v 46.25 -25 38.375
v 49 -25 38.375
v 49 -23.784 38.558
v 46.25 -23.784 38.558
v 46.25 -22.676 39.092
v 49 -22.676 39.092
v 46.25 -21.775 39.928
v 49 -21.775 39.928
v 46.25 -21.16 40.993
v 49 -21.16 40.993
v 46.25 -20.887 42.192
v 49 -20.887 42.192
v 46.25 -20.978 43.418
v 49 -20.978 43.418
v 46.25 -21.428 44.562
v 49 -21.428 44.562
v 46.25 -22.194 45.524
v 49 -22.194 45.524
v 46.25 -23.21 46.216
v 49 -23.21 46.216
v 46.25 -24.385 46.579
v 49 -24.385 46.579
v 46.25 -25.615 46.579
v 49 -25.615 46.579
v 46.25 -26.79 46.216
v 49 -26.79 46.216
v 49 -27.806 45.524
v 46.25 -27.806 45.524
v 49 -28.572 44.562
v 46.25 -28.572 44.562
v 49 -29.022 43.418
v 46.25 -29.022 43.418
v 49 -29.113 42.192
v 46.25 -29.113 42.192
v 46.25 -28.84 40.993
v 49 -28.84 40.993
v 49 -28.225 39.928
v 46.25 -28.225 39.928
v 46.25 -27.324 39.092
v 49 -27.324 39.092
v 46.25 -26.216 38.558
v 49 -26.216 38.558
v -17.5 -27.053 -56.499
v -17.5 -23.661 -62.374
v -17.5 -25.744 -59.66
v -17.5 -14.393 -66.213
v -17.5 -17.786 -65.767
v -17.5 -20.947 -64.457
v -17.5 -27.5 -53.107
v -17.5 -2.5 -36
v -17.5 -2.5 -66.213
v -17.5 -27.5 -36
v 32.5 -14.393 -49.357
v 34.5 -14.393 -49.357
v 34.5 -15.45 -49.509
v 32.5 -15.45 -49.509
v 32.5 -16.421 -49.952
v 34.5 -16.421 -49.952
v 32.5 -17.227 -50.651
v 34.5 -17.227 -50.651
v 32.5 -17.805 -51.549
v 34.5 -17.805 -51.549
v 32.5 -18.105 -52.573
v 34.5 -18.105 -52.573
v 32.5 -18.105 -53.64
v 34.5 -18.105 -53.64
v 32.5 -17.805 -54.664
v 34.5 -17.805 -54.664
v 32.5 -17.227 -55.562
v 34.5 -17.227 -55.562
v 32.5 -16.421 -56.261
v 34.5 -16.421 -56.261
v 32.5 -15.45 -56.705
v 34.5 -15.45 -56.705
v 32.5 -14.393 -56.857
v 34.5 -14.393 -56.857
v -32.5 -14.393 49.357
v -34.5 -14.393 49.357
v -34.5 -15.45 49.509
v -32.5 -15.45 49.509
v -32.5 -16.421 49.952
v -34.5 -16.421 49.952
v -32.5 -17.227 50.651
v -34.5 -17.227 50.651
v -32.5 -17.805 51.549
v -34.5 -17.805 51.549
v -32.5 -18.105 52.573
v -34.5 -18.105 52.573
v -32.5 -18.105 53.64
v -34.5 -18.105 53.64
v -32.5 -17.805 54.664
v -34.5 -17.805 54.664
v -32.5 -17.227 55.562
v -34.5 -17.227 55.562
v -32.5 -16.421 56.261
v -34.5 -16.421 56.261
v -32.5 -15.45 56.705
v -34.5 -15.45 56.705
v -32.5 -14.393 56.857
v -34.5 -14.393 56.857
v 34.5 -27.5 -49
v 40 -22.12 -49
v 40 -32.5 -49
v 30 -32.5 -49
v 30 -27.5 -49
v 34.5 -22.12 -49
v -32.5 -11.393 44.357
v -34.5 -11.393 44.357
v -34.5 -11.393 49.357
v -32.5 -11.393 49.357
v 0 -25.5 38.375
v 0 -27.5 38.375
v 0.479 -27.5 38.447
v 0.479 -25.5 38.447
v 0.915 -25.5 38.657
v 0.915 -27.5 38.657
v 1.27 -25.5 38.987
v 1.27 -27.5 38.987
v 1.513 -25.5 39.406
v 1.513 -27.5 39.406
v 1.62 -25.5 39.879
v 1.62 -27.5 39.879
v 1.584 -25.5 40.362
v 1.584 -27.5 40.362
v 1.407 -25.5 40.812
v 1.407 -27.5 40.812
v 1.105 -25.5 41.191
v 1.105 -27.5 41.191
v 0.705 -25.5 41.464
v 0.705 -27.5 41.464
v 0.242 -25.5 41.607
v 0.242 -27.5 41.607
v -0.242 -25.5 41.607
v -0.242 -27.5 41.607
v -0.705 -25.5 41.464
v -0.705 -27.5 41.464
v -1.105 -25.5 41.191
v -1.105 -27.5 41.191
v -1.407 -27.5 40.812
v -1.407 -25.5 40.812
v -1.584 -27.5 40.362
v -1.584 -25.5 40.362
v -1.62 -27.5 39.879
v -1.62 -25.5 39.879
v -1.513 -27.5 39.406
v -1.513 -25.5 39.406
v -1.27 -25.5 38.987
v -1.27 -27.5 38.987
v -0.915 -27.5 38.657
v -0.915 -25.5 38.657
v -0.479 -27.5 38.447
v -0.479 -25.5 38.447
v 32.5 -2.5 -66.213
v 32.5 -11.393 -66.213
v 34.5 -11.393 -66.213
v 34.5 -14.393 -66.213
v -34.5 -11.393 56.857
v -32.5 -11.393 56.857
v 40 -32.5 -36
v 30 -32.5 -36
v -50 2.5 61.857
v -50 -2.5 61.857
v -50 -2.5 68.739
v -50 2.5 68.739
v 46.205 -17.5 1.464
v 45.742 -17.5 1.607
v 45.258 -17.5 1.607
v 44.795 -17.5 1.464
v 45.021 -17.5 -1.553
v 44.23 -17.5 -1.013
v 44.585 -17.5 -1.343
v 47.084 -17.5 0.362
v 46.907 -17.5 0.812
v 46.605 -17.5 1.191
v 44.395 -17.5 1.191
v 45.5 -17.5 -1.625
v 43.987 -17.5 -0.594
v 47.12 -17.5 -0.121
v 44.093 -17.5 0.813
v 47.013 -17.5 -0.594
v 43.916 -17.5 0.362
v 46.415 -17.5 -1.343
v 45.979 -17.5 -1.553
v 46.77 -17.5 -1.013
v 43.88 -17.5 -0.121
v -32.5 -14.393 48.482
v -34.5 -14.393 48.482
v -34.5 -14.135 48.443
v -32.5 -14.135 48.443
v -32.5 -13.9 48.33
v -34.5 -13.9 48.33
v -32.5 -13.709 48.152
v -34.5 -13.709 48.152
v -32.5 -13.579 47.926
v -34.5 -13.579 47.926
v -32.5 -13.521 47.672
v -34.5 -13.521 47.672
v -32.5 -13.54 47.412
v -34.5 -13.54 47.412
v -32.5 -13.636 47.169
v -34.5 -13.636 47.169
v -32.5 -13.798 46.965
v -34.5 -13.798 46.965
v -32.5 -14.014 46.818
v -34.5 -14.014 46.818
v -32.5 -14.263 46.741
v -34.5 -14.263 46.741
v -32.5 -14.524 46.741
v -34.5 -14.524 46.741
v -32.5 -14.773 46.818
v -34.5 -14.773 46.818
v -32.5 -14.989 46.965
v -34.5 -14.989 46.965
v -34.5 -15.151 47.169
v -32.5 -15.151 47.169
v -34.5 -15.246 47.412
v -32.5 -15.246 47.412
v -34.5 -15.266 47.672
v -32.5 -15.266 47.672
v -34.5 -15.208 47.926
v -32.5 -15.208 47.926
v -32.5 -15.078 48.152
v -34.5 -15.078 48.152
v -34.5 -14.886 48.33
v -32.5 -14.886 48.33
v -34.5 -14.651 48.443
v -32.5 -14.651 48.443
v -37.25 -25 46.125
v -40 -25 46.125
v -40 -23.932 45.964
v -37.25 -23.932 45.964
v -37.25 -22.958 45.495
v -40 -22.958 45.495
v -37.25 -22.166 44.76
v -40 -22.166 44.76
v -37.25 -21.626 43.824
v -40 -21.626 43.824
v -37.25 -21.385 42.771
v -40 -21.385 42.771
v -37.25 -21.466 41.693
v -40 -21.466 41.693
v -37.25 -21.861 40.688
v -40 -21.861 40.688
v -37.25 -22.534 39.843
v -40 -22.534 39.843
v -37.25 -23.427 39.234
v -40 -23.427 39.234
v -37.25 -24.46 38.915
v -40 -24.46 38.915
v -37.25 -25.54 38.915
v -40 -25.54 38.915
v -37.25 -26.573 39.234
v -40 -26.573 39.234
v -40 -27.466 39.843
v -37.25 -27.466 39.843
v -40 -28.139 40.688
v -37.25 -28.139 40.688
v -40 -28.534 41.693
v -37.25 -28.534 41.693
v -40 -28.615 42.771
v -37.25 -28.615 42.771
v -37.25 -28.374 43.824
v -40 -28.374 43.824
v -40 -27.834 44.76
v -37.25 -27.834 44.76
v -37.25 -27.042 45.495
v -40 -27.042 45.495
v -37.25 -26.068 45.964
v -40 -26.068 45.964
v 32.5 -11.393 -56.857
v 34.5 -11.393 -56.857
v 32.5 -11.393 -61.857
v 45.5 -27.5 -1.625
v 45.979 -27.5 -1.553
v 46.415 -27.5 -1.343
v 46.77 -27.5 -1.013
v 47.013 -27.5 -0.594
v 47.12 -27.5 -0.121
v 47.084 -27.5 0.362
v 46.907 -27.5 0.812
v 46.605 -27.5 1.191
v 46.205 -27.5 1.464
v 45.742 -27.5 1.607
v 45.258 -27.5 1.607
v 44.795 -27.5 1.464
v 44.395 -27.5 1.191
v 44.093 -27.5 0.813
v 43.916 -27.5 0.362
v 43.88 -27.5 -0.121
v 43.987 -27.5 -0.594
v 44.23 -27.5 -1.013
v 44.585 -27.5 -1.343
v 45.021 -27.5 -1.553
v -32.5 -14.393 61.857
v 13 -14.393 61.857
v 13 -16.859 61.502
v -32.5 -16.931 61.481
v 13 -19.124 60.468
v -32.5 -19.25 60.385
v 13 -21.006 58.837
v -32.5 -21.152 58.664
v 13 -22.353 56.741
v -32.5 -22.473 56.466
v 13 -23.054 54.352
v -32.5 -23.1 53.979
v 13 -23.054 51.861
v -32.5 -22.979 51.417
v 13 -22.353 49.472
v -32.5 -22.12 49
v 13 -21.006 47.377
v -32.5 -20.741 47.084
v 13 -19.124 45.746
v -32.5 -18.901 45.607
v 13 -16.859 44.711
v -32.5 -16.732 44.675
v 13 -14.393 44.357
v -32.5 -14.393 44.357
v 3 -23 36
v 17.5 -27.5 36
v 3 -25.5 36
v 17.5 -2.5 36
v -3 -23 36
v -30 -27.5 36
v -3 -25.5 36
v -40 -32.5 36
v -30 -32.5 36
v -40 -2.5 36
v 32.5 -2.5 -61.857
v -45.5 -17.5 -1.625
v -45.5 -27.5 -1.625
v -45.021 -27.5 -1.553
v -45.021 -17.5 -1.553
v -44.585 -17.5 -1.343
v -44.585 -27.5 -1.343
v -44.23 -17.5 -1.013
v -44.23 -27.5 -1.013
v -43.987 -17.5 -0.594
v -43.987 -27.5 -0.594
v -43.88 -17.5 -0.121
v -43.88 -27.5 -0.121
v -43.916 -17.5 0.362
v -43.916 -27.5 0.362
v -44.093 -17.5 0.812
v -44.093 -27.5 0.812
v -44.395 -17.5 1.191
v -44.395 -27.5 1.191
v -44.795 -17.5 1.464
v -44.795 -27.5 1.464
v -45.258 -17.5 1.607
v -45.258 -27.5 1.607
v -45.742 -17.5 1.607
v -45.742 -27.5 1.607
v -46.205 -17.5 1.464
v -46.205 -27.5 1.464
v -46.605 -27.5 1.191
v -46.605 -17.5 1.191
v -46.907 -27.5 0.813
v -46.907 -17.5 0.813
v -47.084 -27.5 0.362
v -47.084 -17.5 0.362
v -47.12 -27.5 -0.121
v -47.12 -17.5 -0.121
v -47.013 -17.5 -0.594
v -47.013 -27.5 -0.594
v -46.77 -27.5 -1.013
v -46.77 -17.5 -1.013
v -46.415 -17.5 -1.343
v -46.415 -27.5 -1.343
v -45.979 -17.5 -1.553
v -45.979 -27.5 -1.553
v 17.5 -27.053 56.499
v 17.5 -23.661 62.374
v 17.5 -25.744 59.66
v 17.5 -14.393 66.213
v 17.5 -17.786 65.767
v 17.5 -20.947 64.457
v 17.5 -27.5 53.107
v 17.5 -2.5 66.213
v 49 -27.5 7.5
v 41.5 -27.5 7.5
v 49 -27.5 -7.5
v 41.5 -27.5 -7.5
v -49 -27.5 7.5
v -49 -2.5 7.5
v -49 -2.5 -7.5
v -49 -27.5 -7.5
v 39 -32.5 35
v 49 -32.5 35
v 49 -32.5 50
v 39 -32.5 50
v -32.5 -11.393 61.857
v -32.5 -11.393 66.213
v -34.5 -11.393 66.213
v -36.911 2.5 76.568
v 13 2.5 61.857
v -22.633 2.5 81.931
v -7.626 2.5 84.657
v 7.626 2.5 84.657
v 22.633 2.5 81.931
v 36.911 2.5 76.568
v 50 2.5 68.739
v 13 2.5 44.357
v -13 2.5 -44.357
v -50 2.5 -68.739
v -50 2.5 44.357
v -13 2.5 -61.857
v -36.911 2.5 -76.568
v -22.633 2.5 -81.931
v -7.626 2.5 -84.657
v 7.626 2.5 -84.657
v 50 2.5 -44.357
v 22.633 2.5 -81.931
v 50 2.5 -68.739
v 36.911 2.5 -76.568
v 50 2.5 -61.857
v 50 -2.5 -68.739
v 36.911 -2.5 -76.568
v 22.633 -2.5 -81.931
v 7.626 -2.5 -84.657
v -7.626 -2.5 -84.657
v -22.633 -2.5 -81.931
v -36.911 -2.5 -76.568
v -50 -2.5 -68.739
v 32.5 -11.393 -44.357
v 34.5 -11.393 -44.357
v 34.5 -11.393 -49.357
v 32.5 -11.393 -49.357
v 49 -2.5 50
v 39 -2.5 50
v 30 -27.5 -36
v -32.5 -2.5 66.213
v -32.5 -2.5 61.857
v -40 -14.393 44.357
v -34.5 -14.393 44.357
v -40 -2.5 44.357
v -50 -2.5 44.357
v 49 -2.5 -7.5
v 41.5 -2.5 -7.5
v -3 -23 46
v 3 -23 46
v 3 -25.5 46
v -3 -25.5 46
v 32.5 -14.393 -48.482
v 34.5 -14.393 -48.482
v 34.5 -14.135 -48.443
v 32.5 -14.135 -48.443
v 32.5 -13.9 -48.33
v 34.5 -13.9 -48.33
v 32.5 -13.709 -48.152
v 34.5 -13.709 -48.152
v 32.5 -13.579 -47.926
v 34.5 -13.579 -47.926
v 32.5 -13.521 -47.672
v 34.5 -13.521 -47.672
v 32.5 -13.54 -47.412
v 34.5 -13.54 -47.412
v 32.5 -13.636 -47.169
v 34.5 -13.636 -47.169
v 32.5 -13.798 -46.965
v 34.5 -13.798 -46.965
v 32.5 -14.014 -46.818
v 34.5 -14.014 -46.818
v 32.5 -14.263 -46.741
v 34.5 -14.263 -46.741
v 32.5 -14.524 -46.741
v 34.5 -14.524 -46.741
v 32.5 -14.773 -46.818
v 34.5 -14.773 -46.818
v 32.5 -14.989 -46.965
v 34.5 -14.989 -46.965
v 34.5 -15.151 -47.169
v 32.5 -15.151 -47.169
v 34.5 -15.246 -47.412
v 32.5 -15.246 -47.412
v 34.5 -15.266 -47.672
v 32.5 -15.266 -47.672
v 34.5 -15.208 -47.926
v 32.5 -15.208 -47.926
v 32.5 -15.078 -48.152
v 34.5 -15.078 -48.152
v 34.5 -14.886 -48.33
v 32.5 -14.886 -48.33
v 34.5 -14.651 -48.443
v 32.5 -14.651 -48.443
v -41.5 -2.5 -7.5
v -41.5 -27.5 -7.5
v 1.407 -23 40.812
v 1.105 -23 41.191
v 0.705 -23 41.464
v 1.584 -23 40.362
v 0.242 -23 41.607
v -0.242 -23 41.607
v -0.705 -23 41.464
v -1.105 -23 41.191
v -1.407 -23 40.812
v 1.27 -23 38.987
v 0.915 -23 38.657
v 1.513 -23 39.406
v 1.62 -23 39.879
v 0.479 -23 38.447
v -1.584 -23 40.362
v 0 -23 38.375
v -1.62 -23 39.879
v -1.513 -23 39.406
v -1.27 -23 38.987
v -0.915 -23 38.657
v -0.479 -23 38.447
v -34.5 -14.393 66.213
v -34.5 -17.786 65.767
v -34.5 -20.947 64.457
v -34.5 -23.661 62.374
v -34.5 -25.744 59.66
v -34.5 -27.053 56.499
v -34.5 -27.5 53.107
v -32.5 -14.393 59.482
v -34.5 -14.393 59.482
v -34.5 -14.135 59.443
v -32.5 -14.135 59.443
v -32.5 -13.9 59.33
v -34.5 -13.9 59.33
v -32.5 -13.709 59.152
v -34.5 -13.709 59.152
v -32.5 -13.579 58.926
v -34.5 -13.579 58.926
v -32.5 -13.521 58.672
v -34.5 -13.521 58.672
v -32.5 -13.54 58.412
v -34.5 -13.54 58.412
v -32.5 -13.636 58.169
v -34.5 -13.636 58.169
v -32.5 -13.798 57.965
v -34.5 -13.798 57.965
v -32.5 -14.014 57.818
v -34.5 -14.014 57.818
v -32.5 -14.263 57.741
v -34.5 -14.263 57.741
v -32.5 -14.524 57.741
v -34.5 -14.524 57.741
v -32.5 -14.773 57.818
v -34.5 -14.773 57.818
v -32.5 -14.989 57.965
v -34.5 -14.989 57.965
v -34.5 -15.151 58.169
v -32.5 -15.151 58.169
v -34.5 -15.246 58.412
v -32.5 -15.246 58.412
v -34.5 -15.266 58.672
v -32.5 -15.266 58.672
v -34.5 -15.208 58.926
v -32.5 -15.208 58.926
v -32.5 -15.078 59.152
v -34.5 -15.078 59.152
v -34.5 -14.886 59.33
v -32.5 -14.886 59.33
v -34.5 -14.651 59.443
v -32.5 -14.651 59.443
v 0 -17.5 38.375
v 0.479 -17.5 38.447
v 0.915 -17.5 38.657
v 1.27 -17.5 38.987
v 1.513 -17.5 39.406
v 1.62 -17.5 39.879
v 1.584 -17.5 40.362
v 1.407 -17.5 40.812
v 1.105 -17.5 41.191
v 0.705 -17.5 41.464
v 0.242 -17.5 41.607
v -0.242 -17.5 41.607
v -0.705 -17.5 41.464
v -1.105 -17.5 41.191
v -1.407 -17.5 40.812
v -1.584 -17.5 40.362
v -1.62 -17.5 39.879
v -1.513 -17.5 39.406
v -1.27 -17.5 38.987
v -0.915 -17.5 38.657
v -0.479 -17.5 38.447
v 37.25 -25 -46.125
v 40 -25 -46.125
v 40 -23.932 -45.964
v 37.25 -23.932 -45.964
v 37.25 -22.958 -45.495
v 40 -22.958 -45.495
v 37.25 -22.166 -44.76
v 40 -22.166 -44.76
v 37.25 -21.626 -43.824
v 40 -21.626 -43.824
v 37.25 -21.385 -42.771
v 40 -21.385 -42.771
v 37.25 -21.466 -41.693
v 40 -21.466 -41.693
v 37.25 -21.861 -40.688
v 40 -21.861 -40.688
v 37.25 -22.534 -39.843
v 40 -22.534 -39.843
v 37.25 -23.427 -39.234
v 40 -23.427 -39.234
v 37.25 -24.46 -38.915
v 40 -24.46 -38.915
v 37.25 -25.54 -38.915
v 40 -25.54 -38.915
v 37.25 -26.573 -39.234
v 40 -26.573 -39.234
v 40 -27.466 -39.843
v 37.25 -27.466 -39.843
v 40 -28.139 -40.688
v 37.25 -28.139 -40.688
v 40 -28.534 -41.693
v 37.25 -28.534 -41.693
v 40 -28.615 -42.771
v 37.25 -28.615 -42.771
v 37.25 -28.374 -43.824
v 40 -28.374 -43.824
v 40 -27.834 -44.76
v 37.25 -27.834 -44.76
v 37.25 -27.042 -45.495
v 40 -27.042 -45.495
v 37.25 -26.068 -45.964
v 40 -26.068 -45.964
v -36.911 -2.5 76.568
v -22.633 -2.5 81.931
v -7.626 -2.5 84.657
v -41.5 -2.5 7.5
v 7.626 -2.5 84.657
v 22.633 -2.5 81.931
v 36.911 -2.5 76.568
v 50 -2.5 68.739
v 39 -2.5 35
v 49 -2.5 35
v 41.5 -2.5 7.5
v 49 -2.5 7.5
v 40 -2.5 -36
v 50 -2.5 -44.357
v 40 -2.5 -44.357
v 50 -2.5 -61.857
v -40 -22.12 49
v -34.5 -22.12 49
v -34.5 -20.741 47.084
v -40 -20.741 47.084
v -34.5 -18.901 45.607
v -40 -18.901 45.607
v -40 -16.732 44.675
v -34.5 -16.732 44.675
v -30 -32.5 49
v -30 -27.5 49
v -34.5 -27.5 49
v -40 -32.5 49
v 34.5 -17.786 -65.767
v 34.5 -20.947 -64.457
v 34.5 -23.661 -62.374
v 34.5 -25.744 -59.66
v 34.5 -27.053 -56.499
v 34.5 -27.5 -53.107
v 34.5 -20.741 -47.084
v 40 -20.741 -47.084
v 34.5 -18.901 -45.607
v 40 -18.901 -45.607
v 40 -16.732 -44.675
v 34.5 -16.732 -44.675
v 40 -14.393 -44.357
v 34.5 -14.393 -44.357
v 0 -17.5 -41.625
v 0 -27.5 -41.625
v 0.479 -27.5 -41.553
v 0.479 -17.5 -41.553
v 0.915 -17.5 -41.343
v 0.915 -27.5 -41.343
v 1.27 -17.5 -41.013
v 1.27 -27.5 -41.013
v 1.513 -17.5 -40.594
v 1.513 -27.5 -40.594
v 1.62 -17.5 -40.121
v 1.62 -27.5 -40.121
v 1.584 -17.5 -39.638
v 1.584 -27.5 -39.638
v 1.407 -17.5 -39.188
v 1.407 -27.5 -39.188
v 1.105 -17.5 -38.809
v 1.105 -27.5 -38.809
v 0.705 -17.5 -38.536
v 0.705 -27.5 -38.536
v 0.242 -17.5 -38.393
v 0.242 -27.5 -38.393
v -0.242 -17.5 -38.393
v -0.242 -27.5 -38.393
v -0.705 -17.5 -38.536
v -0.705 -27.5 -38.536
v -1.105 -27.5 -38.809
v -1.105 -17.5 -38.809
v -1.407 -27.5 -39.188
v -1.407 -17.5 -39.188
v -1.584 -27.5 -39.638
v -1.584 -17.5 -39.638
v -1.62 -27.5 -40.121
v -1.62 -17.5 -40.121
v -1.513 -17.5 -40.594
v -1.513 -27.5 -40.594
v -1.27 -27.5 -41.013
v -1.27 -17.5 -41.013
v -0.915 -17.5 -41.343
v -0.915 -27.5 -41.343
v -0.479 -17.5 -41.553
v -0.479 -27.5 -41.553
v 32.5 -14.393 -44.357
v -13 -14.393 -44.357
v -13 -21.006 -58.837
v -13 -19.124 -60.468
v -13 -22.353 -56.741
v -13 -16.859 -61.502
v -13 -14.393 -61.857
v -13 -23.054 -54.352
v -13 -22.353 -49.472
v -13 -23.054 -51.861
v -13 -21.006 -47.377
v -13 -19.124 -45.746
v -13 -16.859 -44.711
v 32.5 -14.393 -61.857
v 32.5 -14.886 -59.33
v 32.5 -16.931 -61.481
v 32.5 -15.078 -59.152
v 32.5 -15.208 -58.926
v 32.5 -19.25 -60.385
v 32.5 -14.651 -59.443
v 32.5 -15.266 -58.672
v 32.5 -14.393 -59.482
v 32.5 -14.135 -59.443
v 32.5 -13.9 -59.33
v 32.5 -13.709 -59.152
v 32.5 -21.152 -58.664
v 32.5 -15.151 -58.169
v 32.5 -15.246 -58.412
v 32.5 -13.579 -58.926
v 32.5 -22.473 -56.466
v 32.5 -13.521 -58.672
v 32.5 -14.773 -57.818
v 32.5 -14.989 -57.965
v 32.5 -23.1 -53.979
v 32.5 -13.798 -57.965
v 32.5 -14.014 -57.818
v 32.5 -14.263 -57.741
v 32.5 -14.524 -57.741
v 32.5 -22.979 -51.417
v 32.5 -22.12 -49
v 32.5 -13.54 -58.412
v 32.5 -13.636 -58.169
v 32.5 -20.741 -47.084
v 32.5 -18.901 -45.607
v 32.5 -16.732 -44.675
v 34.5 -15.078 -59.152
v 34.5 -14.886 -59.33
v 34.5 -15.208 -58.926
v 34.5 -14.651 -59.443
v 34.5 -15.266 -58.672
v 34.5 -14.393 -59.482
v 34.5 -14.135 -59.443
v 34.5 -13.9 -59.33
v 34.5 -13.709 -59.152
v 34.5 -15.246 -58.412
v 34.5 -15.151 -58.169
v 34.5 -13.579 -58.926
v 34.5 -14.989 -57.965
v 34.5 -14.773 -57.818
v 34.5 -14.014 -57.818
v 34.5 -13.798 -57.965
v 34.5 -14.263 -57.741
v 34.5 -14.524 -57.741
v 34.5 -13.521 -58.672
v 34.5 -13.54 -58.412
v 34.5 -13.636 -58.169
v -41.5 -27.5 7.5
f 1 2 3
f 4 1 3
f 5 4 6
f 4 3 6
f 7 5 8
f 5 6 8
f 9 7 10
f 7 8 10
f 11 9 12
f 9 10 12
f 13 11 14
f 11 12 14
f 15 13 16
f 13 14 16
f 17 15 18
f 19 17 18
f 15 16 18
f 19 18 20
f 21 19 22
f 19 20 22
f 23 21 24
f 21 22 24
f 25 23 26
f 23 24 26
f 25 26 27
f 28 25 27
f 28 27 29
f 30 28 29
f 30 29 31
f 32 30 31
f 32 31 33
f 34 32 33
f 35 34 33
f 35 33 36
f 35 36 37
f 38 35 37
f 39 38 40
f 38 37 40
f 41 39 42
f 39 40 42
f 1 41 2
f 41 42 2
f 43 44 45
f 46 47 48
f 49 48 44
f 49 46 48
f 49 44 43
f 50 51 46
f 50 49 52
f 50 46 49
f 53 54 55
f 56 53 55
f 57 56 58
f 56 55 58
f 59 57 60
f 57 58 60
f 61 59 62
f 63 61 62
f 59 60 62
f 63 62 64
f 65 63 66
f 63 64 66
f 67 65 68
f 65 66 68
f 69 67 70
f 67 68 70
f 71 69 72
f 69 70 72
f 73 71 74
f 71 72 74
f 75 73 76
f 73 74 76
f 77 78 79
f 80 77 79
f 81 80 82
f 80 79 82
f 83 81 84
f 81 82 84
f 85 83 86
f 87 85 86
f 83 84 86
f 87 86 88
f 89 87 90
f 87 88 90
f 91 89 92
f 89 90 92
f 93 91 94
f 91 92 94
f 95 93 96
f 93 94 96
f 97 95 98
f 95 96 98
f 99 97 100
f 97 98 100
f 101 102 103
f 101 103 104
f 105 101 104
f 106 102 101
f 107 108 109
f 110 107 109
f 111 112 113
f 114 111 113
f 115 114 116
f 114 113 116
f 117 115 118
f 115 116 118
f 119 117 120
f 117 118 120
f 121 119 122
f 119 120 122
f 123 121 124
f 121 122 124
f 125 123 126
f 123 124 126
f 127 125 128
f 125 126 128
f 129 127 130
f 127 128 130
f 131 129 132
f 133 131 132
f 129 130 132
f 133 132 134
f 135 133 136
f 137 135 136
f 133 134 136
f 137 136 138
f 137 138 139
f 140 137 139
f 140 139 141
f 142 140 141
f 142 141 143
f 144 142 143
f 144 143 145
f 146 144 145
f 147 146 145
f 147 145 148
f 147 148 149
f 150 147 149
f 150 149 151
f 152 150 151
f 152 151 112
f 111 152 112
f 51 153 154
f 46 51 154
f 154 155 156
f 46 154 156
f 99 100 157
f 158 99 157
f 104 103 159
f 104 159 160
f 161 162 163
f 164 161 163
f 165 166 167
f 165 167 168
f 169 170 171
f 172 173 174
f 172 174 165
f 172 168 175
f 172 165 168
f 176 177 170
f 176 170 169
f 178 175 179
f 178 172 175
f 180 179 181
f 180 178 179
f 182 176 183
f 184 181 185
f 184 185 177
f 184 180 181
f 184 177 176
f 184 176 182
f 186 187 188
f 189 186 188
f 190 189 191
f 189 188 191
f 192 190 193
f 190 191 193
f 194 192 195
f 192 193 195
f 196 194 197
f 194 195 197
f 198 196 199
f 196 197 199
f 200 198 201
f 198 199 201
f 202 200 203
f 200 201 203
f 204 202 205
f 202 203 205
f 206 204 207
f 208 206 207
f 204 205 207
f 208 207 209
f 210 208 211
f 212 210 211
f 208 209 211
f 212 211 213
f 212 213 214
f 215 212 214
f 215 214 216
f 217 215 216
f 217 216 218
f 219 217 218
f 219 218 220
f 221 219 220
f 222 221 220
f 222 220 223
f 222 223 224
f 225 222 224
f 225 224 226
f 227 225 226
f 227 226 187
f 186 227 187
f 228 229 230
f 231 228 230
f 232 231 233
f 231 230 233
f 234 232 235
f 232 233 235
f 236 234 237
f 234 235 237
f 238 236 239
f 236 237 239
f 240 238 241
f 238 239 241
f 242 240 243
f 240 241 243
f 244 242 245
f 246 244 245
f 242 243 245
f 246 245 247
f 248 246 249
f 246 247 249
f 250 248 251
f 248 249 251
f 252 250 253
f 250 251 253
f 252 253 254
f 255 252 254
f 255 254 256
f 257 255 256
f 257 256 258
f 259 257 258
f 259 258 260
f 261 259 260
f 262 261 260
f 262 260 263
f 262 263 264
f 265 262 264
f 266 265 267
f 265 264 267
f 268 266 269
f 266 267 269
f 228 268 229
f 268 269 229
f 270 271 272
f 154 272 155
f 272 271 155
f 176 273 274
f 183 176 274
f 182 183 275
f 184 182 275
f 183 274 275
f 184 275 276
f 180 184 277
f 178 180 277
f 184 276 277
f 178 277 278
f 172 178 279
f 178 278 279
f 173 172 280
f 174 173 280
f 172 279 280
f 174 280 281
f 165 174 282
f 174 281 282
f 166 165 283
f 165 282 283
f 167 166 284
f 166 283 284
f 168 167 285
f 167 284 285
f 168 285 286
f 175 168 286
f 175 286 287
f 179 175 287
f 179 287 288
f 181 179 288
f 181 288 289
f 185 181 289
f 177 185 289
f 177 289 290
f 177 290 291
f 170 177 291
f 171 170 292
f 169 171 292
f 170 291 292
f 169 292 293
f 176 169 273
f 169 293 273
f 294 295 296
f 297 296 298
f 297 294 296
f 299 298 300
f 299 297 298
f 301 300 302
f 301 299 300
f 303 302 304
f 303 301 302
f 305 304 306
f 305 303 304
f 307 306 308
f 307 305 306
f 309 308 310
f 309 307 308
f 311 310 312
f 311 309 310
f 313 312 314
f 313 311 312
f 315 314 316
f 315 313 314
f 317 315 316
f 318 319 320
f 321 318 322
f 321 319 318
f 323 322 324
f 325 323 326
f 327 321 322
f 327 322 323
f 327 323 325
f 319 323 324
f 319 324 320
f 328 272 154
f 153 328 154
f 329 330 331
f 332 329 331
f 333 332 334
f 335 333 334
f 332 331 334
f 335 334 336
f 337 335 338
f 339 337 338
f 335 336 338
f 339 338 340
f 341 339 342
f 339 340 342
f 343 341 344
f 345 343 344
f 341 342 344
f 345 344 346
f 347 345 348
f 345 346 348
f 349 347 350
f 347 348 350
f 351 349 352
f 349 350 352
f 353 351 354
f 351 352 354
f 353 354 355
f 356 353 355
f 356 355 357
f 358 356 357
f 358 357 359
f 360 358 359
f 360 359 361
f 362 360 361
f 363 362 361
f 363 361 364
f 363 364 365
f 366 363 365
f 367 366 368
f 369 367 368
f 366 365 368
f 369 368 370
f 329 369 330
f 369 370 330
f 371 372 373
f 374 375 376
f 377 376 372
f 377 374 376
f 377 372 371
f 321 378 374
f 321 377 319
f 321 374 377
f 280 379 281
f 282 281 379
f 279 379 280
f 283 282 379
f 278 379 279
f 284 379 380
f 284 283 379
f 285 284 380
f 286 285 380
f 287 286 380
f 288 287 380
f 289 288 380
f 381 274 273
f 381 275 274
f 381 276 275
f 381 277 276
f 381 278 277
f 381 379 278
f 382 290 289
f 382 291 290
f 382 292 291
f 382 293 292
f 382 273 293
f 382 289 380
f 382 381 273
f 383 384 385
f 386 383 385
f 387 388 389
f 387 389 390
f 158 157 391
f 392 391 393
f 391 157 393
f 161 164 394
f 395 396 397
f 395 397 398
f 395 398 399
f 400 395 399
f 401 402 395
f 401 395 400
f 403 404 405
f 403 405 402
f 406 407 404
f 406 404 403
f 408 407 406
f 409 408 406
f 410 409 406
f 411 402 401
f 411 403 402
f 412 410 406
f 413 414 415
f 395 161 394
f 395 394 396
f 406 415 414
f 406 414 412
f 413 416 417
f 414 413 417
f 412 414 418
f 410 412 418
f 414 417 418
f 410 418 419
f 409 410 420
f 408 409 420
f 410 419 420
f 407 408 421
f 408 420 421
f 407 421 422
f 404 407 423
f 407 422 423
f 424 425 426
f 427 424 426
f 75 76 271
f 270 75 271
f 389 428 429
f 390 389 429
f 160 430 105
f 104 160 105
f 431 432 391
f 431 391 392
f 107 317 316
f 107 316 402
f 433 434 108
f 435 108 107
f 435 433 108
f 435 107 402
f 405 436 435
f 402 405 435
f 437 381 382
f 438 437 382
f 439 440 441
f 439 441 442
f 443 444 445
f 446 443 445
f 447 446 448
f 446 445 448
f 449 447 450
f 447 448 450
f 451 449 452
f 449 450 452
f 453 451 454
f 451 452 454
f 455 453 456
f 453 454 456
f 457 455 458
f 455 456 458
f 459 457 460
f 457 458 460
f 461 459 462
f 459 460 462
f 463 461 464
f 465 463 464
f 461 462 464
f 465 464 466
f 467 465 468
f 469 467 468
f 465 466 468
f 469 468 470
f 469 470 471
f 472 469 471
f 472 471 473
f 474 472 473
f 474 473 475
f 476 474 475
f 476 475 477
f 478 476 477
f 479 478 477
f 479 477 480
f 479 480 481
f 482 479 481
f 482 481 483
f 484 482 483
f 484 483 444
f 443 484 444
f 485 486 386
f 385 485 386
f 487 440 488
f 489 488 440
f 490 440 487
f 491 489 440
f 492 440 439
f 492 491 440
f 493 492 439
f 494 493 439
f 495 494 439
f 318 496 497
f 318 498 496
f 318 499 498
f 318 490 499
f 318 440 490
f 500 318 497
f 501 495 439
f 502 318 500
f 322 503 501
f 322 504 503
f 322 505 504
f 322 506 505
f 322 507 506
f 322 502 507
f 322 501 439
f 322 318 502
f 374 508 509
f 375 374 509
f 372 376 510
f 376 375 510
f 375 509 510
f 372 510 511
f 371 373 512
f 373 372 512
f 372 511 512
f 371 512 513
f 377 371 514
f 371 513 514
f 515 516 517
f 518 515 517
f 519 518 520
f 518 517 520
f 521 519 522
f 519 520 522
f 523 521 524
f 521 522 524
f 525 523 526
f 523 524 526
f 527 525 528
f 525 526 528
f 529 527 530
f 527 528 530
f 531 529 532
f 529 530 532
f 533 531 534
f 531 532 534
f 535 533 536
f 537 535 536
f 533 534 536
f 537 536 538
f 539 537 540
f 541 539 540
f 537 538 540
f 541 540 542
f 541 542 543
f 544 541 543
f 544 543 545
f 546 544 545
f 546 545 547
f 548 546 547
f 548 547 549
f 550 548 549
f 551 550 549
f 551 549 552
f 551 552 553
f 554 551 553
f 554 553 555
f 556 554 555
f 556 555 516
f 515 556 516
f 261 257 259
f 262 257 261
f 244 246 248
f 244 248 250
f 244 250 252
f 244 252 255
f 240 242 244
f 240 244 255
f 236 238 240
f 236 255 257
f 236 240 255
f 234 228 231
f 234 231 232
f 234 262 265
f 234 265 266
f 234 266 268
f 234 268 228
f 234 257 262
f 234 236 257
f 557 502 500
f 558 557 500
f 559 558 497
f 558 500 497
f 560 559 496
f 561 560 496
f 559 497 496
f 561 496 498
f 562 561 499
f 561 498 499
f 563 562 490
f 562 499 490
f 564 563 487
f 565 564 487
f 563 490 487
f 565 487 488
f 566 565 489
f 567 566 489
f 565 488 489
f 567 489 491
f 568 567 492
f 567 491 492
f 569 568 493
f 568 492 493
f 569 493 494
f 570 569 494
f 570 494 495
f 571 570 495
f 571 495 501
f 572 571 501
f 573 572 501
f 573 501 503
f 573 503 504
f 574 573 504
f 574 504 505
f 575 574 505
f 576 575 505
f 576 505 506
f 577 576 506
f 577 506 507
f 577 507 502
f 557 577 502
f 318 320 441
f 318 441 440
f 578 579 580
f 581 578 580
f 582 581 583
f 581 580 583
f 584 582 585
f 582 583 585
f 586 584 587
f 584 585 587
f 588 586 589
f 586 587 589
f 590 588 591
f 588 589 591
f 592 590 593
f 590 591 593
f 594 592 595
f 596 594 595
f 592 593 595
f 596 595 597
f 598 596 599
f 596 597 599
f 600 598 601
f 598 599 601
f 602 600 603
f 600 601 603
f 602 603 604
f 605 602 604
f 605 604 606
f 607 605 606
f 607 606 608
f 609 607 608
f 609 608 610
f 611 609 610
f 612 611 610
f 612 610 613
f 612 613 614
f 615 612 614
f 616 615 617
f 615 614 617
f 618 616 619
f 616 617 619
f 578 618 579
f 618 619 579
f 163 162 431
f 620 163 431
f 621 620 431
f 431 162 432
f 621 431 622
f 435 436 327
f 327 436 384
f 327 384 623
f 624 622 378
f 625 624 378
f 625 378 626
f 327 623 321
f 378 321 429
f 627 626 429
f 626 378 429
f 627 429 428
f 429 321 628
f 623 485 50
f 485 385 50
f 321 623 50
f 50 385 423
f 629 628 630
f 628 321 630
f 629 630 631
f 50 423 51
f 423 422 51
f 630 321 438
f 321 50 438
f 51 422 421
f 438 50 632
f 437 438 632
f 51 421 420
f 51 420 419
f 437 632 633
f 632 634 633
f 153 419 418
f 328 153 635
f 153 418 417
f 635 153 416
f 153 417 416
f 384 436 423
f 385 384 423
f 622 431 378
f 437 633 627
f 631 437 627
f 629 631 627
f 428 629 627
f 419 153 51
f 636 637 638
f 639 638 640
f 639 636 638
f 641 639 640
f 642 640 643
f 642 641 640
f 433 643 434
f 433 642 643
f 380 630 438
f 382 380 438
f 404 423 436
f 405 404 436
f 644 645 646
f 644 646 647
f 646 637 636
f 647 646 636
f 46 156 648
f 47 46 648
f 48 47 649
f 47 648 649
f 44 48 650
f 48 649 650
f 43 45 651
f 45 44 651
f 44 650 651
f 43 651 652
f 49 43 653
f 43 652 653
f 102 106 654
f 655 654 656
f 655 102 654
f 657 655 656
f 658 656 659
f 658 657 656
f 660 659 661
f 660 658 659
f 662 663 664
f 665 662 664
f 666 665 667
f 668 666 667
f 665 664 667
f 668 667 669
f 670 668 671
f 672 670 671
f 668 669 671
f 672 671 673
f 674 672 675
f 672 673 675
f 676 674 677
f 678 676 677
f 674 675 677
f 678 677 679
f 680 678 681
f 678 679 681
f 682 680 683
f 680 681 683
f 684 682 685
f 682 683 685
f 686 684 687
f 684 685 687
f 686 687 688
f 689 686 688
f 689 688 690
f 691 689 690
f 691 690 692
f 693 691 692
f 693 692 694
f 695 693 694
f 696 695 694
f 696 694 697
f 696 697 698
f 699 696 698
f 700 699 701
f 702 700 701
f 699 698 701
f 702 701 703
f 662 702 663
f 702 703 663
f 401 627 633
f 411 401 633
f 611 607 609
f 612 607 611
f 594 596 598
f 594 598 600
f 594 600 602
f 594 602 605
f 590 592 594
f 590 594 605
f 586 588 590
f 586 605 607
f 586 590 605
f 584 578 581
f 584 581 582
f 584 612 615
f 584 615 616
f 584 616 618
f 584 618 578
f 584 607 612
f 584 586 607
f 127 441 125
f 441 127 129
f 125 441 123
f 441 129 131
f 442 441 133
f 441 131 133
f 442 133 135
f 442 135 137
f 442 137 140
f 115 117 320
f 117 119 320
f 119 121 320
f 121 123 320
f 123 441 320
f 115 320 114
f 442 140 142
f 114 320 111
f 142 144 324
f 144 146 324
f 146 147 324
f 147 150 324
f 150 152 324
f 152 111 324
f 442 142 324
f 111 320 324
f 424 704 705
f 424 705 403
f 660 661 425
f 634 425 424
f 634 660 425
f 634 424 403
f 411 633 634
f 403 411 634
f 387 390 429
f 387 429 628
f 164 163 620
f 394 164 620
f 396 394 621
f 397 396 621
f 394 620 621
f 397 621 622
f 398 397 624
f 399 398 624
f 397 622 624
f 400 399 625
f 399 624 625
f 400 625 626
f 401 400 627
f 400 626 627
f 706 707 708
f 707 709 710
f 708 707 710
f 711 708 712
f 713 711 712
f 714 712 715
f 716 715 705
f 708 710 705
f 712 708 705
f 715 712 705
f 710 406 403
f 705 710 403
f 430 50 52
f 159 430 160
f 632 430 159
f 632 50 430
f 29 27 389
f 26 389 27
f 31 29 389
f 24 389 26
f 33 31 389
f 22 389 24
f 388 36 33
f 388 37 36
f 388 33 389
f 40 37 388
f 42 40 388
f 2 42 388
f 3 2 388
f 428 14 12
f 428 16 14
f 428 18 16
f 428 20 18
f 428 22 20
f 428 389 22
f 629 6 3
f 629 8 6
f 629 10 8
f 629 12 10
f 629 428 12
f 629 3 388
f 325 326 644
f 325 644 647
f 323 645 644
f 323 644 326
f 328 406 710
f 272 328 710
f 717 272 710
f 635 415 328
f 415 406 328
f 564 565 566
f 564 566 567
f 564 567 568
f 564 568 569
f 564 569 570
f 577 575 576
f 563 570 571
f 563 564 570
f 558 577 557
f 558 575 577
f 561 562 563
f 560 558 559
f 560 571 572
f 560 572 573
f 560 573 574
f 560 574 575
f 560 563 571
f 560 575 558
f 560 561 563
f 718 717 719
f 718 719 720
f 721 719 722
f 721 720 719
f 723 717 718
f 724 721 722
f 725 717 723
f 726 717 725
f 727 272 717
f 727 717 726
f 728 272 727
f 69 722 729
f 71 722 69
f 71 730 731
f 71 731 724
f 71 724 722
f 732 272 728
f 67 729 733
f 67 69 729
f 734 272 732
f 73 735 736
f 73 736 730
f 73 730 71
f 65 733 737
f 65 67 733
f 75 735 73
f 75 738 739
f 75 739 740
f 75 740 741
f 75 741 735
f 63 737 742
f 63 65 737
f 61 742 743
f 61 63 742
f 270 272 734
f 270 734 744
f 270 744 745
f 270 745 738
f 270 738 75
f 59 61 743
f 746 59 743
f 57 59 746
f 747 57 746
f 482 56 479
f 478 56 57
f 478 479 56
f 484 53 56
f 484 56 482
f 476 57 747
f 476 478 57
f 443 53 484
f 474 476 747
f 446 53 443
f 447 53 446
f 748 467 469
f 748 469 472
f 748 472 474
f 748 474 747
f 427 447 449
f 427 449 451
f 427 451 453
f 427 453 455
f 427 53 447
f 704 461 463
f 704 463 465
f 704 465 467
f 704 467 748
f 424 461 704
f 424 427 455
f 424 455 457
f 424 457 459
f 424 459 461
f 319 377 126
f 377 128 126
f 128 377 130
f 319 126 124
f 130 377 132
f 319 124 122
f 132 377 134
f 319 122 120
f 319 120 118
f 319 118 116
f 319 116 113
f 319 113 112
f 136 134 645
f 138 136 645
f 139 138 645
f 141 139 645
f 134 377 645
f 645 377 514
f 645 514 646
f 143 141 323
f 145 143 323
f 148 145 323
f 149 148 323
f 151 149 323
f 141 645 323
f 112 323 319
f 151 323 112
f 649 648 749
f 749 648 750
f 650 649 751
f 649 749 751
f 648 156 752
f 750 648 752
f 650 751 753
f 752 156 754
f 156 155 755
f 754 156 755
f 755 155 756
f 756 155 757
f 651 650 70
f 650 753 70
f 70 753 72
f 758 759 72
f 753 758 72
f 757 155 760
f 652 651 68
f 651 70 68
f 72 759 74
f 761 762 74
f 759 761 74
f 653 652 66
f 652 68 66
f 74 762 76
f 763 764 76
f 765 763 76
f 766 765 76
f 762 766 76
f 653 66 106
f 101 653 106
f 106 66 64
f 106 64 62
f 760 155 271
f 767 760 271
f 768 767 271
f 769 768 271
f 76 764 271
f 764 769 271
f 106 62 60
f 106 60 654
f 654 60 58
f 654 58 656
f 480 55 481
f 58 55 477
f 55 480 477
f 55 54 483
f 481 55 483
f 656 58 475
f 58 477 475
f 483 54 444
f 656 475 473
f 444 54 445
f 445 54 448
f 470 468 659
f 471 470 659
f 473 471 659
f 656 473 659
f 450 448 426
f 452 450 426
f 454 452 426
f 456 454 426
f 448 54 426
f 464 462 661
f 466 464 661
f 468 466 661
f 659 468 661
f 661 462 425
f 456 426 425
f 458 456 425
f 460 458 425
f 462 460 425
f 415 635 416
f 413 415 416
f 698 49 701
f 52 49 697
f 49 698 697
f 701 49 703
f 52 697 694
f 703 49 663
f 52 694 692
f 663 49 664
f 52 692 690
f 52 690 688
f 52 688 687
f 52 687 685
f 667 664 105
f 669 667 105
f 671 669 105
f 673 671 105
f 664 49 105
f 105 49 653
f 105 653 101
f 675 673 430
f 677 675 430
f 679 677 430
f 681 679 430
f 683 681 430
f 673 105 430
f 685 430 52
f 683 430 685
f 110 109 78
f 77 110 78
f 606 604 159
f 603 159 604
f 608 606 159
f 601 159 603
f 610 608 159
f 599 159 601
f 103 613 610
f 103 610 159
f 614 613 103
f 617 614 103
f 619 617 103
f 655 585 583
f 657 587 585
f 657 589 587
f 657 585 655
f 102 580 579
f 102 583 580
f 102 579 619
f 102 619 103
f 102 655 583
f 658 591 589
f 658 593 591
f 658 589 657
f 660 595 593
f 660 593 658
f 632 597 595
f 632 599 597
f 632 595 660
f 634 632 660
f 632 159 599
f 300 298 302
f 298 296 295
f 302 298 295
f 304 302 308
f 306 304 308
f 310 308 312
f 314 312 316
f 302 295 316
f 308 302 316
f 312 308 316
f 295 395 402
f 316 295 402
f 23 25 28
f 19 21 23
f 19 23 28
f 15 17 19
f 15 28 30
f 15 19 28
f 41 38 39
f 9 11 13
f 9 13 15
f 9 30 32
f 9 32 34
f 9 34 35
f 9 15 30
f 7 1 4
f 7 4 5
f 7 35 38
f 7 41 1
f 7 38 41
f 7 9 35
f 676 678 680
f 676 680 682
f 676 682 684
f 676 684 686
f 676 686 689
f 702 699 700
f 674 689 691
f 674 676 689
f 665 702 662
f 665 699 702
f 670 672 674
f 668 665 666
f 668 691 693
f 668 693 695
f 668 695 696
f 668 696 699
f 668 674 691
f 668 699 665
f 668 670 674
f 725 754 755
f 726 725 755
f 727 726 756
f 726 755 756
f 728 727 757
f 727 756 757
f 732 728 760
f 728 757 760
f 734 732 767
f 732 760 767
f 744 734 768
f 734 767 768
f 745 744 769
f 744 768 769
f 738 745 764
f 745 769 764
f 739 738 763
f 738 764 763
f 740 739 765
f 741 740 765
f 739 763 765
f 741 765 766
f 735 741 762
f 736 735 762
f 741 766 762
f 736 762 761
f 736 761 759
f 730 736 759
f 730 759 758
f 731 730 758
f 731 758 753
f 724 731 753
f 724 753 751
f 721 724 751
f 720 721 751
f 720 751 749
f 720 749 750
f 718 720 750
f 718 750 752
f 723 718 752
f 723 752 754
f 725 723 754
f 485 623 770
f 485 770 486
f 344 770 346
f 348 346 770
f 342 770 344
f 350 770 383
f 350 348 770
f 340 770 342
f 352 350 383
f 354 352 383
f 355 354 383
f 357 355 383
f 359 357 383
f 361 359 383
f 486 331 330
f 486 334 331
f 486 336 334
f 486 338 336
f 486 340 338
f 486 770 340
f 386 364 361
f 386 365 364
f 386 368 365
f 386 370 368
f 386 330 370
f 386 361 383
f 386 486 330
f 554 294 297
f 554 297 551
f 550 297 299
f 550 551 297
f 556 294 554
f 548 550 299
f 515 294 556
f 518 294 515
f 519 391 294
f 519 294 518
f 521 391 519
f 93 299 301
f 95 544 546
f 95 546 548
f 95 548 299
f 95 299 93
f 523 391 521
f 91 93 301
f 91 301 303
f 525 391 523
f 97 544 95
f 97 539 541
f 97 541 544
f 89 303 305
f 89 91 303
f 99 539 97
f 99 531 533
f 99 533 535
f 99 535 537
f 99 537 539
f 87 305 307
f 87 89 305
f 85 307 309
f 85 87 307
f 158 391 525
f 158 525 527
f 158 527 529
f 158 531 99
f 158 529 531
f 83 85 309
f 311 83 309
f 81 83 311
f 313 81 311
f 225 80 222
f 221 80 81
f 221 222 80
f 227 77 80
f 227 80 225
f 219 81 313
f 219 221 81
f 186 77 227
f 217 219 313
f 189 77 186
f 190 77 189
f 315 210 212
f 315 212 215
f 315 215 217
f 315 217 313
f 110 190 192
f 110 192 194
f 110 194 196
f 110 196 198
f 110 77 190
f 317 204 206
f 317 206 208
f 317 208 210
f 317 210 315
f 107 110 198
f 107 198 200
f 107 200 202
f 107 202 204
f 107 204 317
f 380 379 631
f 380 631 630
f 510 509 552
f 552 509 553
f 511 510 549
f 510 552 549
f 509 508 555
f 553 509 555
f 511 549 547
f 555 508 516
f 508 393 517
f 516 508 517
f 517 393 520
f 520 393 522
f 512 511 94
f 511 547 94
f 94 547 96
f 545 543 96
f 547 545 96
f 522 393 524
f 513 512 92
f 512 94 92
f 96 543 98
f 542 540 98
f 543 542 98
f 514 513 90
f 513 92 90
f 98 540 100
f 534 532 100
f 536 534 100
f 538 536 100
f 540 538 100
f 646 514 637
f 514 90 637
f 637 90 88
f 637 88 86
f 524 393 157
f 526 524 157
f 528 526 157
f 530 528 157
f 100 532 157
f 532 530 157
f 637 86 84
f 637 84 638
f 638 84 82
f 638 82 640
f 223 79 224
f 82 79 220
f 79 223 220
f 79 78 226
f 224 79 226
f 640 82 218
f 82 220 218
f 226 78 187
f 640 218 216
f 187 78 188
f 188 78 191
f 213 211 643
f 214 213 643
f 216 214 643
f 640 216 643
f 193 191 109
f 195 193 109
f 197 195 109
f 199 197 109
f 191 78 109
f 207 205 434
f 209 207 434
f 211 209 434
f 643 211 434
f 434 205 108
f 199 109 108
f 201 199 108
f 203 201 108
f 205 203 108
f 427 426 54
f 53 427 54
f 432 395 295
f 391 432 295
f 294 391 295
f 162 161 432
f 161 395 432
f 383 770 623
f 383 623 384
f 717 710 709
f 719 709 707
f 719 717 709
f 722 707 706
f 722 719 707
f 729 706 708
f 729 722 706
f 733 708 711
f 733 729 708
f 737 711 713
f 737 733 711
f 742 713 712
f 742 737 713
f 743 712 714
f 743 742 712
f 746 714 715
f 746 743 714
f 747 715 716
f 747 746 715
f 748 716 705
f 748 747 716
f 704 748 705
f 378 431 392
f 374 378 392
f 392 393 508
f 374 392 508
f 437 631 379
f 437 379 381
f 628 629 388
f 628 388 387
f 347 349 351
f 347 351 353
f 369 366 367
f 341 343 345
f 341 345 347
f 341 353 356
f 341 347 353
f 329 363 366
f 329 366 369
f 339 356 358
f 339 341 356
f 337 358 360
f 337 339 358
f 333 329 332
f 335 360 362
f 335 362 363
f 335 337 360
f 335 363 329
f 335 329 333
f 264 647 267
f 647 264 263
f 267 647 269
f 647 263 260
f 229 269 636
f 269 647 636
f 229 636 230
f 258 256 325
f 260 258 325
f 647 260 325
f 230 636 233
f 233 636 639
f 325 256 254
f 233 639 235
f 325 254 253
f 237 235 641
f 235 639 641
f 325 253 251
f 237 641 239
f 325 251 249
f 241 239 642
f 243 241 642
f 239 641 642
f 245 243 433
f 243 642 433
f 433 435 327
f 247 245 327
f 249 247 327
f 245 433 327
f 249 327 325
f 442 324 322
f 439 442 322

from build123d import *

# Parameters (mm, degrees)
BASE_DEPTH          = 2.5
BASE_DEPTH_BACK     = 2.5
SKETCH2_W           = 7.5
SKETCH2_H           = 15
SKETCH2_W_2         = 15
SKETCH2_H_2         = 7.5
BATTERYHOLDER_DEPTH = 25
SKETCH3_R           = 1.625
CUT_EXTRUDE1_DEPTH  = 10
SKETCH5_W           = 10
SKETCH5_H           = 13
BOSS_EXTRUDE2_DEPTH = 30
SKETCH6_R           = 3.625
CUT_EXTRUDE2_DEPTH  = 2.75
SKETCH7_R           = 3.625
CUT_EXTRUDE3_DEPTH  = 2.75
BOSS_EXTRUDE4_DEPTH = 25
CUT_EXTRUDE6_START  = -50
CUT_EXTRUDE6_DEPTH  = 63
CUT_EXTRUDE7_REACH  = 124.831
BOSS_EXTRUDE5_START = 2
BOSS_EXTRUDE5_DEPTH = 2
CUT_EXTRUDE8_REACH  = 126.183
SKETCH15_R          = 0.875
SKETCH16_W          = 6
SKETCH16_H          = 2.5
NUTCUT_DEPTH        = 10
SKETCH17_W          = 10
SKETCH17_H          = 15
BOSS_EXTRUDE6_DEPTH = 30
SKETCH18_R          = 4.125
CUT_EXTRUDE11_DEPTH = 2.75
CIRPATTERN2_COUNT   = 2


with BuildPart() as part:
    # Sketch1 → Base (new, two sides: drawn at the far end of the back side and taken through both)
    with BuildSketch(Plane(origin=(0, 0, 0), x_dir=(1, 0, 0), z_dir=(0, 1, 0)).offset(-BASE_DEPTH_BACK)):
        with BuildLine():
            Line((-50, 68.738635424), (-50, -68.738635424))
            ThreePointArc((-50, -68.738635424), (0, -85), (50, -68.738635424))
            Line((50, -68.738635424), (50, 68.738635424))
            ThreePointArc((50, 68.738635424), (0, 85), (-50, 68.738635424))
        make_face()
    extrude(amount=BASE_DEPTH + BASE_DEPTH_BACK)

    # Sketch2 → BatteryHolder (add)
    with BuildSketch(Plane(origin=(0, -2.5, 0), x_dir=(-1, 0, 0), z_dir=(0, -1, 0))):
        with Locations((45.25, 0)):
            Rectangle(SKETCH2_W, SKETCH2_H)
        with Locations((0, -39.75)):
            Rectangle(SKETCH2_W_2, SKETCH2_H_2)
        with Locations((-45.25, 0)):
            Rectangle(SKETCH2_W, SKETCH2_H)
        with Locations((0, 39.75)):
            Rectangle(SKETCH2_W_2, SKETCH2_H_2)
    extrude(amount=BATTERYHOLDER_DEPTH)

    # Sketch3 → Cut-Extrude1 (cut)
    with BuildSketch(Plane(origin=(0, -27.5, 0), x_dir=(-1, 0, 0), z_dir=(0, -1, 0))):
        with Locations(Location((45.5, 0, 0), (0, 0, 90))):
            Circle(SKETCH3_R)
        with Locations(Location((0, -40, 0), (0, 0, 90))):
            Circle(SKETCH3_R)
        with Locations(Location((-45.5, 0, 0), (0, 0, 90))):
            Circle(SKETCH3_R)
        with Locations(Location((0, 40, 0), (0, 0, 90))):
            Circle(SKETCH3_R)
    extrude(amount=-CUT_EXTRUDE1_DEPTH, mode=Mode.SUBTRACT)

    # Sketch5 → Boss-Extrude2 (add)
    with BuildSketch(Plane(origin=(0, -2.5, 0), x_dir=(-1, 0, 0), z_dir=(0, -1, 0))):
        with Locations((35, -42.5)):
            Rectangle(SKETCH5_W, SKETCH5_H)
        with Locations((-35, 42.5)):
            Rectangle(SKETCH5_W, SKETCH5_H)
    extrude(amount=BOSS_EXTRUDE2_DEPTH)

    # Sketch6 → Cut-Extrude2 (cut)
    with BuildSketch(Plane.ZY.offset(40)):
        with Locations((42.5, -25)):
            Circle(SKETCH6_R)
    extrude(amount=-CUT_EXTRUDE2_DEPTH, mode=Mode.SUBTRACT)

    # Sketch7 → Cut-Extrude3 (cut)
    with BuildSketch(Plane(origin=(40, 0, 0), x_dir=(0, 0, -1), z_dir=(1, 0, 0))):
        with Locations((42.5, -25)):
            Circle(SKETCH7_R)
    extrude(amount=-CUT_EXTRUDE3_DEPTH, mode=Mode.SUBTRACT)

    # Sketch12 → Boss-Extrude4 (add)
    with BuildSketch(Plane(origin=(0, -2.5, 0), x_dir=(-1, 0, 0), z_dir=(0, -1, 0))):
        Polygon((30, -49), (32.5, -49), (32.5, -68.5), (-17.5, -68.5), (-17.5, -36), (-7.5, -36), (-7.5, -43.5), (7.5, -43.5), (7.5, -36), (30, -36), align=None)
    boss_extrude4 = extrude(amount=BOSS_EXTRUDE4_DEPTH)

    # Sketch11 → Cut-Extrude6 (cut)
    with BuildSketch(Plane(origin=(0, 0, 0), x_dir=(0, 0, -1), z_dir=(1, 0, 0)).offset(CUT_EXTRUDE6_START)):
        with BuildLine():
            Line((-44.356601718, -14.393398282), (-44.356601718, 2.5))
            Line((-44.356601718, 2.5), (-61.856601718, 2.5))
            Line((-61.856601718, 2.5), (-61.856601718, -14.393398282))
            ThreePointArc((-61.856601718, -14.393398282), (-53.106601718, -23.143398282), (-44.356601718, -14.393398282))
        make_face()
    cut_extrude6 = extrude(amount=CUT_EXTRUDE6_DEPTH, mode=Mode.SUBTRACT)

    # Sketch13 → Cut-Extrude7 (cut, up to next)
    with BuildSketch(Plane.ZY.offset(32.5), mode=Mode.PRIVATE) as cut_extrude7_sk1:
        with BuildLine():
            Line((66.213203436, -14.393398282), (66.213203436, -2.5))
            Line((66.213203436, -2.5), (68.5, -2.5))
            Line((68.5, -2.5), (68.5, -27.5))
            Line((68.5, -27.5), (53.106601718, -27.5))
            ThreePointArc((53.106601718, -27.5), (62.374368671, -23.661165235), (66.213203436, -14.393398282))
        make_face()
    cut_extrude7_tool1 = extrude(cut_extrude7_sk1.sketch, amount=-CUT_EXTRUDE7_REACH, mode=Mode.PRIVATE) & part.part
    cut_extrude7 = cut_extrude7_tool1.solids().sort_by_distance((-32.5, -18.752717, 65.76063))[0]
    add(cut_extrude7, mode=Mode.SUBTRACT)

    # Sketch14 → Boss-Extrude5 (add)
    with BuildSketch(Plane.ZY.offset(32.5).offset(BOSS_EXTRUDE5_START)):
        with BuildLine():
            Line((49, -27.5), (49, -22.119867225))
            ThreePointArc((49, -22.119867225), (45.606759552, -18.900600018), (44.356601718, -14.393398282))
            Line((44.356601718, -14.393398282), (44.356601718, -11.393398282))
            Line((44.356601718, -11.393398282), (49.356601718, -11.393398282))
            Line((49.356601718, -11.393398282), (49.356601718, -14.393398282))
            ThreePointArc((49.356601718, -14.393398282), (53.106601718, -18.143398282), (56.856601718, -14.393398282))
            Line((56.856601718, -14.393398282), (56.856601718, -11.393398282))
            Line((56.856601718, -11.393398282), (66.213203436, -11.393398282))
            Line((66.213203436, -11.393398282), (66.213203436, -14.393398282))
            ThreePointArc((66.213203436, -14.393398282), (62.374368671, -23.661165235), (53.106601718, -27.5))
            Line((53.106601718, -27.5), (49, -27.5))
        make_face()
    boss_extrude5 = extrude(amount=-BOSS_EXTRUDE5_DEPTH)

    # Sketch15 → Cut-Extrude8 (cut, up to next)
    with BuildSketch(Plane.ZY.offset(34.5), mode=Mode.PRIVATE) as cut_extrude8_sk1:
        with Locations((58.606601718, -14.393398282)):
            Circle(SKETCH15_R)
    cut_extrude8_tool1 = extrude(cut_extrude8_sk1.sketch, amount=-CUT_EXTRUDE8_REACH, mode=Mode.PRIVATE) & part.part
    # Sketch15 → Cut-Extrude8 (cut, up to next)
    with BuildSketch(Plane.ZY.offset(34.5), mode=Mode.PRIVATE) as cut_extrude8_sk2:
        with Locations((47.606601718, -14.393398282)):
            Circle(SKETCH15_R)
    cut_extrude8_tool2 = extrude(cut_extrude8_sk2.sketch, amount=-CUT_EXTRUDE8_REACH, mode=Mode.PRIVATE) & part.part
    cut_extrude8_1 = cut_extrude8_tool1.solids().sort_by_distance((-34.5, -14.393398, 58.606602))[0]
    add(cut_extrude8_1, mode=Mode.SUBTRACT)
    cut_extrude8_2 = cut_extrude8_tool2.solids().sort_by_distance((-34.5, -14.393398, 47.606602))[0]
    add(cut_extrude8_2, mode=Mode.SUBTRACT)
    cut_extrude8 = cut_extrude8_1 + cut_extrude8_2  # Cut-Extrude8 as one shape, for the pattern or mirror that repeats it

    # Sketch16 → NutCut (cut)
    with BuildSketch(Plane(origin=(0, 0, 36), x_dir=(-1, 0, 0), z_dir=(0, 0, -1))):
        with Locations((0, -24.25)):
            Rectangle(SKETCH16_W, SKETCH16_H)
    extrude(amount=-NUTCUT_DEPTH, mode=Mode.SUBTRACT)

    # Sketch17 → Boss-Extrude6 (add)
    with BuildSketch(Plane(origin=(0, -2.5, 0), x_dir=(-1, 0, 0), z_dir=(0, -1, 0))):
        with Locations((-44, -42.5)):
            Rectangle(SKETCH17_W, SKETCH17_H)
    extrude(amount=BOSS_EXTRUDE6_DEPTH)

    # Sketch18 → Cut-Extrude11 (cut)
    with BuildSketch(Plane(origin=(49, 0, 0), x_dir=(0, 0, -1), z_dir=(1, 0, 0))):
        with Locations((-42.5, -25)):
            Circle(SKETCH18_R)
    extrude(amount=-CUT_EXTRUDE11_DEPTH, mode=Mode.SUBTRACT)

    # CirPattern2: Boss-Extrude4, Cut-Extrude6, Cut-Extrude7, Boss-Extrude5, Cut-Extrude8 ×2 about axis
    cirpattern2_axis = Axis((0, 0, 0), (0, 1, 0))
    add([boss_extrude4.rotate(cirpattern2_axis, i * 360 / CIRPATTERN2_COUNT) for i in range(1, CIRPATTERN2_COUNT)])
    add([cut_extrude6.rotate(cirpattern2_axis, i * 360 / CIRPATTERN2_COUNT) for i in range(1, CIRPATTERN2_COUNT)], mode=Mode.SUBTRACT)
    add([cut_extrude7.rotate(cirpattern2_axis, i * 360 / CIRPATTERN2_COUNT) for i in range(1, CIRPATTERN2_COUNT)], mode=Mode.SUBTRACT)
    add([boss_extrude5.rotate(cirpattern2_axis, i * 360 / CIRPATTERN2_COUNT) for i in range(1, CIRPATTERN2_COUNT)])
    add([cut_extrude8.rotate(cirpattern2_axis, i * 360 / CIRPATTERN2_COUNT) for i in range(1, CIRPATTERN2_COUNT)], mode=Mode.SUBTRACT)


solid = part.part
